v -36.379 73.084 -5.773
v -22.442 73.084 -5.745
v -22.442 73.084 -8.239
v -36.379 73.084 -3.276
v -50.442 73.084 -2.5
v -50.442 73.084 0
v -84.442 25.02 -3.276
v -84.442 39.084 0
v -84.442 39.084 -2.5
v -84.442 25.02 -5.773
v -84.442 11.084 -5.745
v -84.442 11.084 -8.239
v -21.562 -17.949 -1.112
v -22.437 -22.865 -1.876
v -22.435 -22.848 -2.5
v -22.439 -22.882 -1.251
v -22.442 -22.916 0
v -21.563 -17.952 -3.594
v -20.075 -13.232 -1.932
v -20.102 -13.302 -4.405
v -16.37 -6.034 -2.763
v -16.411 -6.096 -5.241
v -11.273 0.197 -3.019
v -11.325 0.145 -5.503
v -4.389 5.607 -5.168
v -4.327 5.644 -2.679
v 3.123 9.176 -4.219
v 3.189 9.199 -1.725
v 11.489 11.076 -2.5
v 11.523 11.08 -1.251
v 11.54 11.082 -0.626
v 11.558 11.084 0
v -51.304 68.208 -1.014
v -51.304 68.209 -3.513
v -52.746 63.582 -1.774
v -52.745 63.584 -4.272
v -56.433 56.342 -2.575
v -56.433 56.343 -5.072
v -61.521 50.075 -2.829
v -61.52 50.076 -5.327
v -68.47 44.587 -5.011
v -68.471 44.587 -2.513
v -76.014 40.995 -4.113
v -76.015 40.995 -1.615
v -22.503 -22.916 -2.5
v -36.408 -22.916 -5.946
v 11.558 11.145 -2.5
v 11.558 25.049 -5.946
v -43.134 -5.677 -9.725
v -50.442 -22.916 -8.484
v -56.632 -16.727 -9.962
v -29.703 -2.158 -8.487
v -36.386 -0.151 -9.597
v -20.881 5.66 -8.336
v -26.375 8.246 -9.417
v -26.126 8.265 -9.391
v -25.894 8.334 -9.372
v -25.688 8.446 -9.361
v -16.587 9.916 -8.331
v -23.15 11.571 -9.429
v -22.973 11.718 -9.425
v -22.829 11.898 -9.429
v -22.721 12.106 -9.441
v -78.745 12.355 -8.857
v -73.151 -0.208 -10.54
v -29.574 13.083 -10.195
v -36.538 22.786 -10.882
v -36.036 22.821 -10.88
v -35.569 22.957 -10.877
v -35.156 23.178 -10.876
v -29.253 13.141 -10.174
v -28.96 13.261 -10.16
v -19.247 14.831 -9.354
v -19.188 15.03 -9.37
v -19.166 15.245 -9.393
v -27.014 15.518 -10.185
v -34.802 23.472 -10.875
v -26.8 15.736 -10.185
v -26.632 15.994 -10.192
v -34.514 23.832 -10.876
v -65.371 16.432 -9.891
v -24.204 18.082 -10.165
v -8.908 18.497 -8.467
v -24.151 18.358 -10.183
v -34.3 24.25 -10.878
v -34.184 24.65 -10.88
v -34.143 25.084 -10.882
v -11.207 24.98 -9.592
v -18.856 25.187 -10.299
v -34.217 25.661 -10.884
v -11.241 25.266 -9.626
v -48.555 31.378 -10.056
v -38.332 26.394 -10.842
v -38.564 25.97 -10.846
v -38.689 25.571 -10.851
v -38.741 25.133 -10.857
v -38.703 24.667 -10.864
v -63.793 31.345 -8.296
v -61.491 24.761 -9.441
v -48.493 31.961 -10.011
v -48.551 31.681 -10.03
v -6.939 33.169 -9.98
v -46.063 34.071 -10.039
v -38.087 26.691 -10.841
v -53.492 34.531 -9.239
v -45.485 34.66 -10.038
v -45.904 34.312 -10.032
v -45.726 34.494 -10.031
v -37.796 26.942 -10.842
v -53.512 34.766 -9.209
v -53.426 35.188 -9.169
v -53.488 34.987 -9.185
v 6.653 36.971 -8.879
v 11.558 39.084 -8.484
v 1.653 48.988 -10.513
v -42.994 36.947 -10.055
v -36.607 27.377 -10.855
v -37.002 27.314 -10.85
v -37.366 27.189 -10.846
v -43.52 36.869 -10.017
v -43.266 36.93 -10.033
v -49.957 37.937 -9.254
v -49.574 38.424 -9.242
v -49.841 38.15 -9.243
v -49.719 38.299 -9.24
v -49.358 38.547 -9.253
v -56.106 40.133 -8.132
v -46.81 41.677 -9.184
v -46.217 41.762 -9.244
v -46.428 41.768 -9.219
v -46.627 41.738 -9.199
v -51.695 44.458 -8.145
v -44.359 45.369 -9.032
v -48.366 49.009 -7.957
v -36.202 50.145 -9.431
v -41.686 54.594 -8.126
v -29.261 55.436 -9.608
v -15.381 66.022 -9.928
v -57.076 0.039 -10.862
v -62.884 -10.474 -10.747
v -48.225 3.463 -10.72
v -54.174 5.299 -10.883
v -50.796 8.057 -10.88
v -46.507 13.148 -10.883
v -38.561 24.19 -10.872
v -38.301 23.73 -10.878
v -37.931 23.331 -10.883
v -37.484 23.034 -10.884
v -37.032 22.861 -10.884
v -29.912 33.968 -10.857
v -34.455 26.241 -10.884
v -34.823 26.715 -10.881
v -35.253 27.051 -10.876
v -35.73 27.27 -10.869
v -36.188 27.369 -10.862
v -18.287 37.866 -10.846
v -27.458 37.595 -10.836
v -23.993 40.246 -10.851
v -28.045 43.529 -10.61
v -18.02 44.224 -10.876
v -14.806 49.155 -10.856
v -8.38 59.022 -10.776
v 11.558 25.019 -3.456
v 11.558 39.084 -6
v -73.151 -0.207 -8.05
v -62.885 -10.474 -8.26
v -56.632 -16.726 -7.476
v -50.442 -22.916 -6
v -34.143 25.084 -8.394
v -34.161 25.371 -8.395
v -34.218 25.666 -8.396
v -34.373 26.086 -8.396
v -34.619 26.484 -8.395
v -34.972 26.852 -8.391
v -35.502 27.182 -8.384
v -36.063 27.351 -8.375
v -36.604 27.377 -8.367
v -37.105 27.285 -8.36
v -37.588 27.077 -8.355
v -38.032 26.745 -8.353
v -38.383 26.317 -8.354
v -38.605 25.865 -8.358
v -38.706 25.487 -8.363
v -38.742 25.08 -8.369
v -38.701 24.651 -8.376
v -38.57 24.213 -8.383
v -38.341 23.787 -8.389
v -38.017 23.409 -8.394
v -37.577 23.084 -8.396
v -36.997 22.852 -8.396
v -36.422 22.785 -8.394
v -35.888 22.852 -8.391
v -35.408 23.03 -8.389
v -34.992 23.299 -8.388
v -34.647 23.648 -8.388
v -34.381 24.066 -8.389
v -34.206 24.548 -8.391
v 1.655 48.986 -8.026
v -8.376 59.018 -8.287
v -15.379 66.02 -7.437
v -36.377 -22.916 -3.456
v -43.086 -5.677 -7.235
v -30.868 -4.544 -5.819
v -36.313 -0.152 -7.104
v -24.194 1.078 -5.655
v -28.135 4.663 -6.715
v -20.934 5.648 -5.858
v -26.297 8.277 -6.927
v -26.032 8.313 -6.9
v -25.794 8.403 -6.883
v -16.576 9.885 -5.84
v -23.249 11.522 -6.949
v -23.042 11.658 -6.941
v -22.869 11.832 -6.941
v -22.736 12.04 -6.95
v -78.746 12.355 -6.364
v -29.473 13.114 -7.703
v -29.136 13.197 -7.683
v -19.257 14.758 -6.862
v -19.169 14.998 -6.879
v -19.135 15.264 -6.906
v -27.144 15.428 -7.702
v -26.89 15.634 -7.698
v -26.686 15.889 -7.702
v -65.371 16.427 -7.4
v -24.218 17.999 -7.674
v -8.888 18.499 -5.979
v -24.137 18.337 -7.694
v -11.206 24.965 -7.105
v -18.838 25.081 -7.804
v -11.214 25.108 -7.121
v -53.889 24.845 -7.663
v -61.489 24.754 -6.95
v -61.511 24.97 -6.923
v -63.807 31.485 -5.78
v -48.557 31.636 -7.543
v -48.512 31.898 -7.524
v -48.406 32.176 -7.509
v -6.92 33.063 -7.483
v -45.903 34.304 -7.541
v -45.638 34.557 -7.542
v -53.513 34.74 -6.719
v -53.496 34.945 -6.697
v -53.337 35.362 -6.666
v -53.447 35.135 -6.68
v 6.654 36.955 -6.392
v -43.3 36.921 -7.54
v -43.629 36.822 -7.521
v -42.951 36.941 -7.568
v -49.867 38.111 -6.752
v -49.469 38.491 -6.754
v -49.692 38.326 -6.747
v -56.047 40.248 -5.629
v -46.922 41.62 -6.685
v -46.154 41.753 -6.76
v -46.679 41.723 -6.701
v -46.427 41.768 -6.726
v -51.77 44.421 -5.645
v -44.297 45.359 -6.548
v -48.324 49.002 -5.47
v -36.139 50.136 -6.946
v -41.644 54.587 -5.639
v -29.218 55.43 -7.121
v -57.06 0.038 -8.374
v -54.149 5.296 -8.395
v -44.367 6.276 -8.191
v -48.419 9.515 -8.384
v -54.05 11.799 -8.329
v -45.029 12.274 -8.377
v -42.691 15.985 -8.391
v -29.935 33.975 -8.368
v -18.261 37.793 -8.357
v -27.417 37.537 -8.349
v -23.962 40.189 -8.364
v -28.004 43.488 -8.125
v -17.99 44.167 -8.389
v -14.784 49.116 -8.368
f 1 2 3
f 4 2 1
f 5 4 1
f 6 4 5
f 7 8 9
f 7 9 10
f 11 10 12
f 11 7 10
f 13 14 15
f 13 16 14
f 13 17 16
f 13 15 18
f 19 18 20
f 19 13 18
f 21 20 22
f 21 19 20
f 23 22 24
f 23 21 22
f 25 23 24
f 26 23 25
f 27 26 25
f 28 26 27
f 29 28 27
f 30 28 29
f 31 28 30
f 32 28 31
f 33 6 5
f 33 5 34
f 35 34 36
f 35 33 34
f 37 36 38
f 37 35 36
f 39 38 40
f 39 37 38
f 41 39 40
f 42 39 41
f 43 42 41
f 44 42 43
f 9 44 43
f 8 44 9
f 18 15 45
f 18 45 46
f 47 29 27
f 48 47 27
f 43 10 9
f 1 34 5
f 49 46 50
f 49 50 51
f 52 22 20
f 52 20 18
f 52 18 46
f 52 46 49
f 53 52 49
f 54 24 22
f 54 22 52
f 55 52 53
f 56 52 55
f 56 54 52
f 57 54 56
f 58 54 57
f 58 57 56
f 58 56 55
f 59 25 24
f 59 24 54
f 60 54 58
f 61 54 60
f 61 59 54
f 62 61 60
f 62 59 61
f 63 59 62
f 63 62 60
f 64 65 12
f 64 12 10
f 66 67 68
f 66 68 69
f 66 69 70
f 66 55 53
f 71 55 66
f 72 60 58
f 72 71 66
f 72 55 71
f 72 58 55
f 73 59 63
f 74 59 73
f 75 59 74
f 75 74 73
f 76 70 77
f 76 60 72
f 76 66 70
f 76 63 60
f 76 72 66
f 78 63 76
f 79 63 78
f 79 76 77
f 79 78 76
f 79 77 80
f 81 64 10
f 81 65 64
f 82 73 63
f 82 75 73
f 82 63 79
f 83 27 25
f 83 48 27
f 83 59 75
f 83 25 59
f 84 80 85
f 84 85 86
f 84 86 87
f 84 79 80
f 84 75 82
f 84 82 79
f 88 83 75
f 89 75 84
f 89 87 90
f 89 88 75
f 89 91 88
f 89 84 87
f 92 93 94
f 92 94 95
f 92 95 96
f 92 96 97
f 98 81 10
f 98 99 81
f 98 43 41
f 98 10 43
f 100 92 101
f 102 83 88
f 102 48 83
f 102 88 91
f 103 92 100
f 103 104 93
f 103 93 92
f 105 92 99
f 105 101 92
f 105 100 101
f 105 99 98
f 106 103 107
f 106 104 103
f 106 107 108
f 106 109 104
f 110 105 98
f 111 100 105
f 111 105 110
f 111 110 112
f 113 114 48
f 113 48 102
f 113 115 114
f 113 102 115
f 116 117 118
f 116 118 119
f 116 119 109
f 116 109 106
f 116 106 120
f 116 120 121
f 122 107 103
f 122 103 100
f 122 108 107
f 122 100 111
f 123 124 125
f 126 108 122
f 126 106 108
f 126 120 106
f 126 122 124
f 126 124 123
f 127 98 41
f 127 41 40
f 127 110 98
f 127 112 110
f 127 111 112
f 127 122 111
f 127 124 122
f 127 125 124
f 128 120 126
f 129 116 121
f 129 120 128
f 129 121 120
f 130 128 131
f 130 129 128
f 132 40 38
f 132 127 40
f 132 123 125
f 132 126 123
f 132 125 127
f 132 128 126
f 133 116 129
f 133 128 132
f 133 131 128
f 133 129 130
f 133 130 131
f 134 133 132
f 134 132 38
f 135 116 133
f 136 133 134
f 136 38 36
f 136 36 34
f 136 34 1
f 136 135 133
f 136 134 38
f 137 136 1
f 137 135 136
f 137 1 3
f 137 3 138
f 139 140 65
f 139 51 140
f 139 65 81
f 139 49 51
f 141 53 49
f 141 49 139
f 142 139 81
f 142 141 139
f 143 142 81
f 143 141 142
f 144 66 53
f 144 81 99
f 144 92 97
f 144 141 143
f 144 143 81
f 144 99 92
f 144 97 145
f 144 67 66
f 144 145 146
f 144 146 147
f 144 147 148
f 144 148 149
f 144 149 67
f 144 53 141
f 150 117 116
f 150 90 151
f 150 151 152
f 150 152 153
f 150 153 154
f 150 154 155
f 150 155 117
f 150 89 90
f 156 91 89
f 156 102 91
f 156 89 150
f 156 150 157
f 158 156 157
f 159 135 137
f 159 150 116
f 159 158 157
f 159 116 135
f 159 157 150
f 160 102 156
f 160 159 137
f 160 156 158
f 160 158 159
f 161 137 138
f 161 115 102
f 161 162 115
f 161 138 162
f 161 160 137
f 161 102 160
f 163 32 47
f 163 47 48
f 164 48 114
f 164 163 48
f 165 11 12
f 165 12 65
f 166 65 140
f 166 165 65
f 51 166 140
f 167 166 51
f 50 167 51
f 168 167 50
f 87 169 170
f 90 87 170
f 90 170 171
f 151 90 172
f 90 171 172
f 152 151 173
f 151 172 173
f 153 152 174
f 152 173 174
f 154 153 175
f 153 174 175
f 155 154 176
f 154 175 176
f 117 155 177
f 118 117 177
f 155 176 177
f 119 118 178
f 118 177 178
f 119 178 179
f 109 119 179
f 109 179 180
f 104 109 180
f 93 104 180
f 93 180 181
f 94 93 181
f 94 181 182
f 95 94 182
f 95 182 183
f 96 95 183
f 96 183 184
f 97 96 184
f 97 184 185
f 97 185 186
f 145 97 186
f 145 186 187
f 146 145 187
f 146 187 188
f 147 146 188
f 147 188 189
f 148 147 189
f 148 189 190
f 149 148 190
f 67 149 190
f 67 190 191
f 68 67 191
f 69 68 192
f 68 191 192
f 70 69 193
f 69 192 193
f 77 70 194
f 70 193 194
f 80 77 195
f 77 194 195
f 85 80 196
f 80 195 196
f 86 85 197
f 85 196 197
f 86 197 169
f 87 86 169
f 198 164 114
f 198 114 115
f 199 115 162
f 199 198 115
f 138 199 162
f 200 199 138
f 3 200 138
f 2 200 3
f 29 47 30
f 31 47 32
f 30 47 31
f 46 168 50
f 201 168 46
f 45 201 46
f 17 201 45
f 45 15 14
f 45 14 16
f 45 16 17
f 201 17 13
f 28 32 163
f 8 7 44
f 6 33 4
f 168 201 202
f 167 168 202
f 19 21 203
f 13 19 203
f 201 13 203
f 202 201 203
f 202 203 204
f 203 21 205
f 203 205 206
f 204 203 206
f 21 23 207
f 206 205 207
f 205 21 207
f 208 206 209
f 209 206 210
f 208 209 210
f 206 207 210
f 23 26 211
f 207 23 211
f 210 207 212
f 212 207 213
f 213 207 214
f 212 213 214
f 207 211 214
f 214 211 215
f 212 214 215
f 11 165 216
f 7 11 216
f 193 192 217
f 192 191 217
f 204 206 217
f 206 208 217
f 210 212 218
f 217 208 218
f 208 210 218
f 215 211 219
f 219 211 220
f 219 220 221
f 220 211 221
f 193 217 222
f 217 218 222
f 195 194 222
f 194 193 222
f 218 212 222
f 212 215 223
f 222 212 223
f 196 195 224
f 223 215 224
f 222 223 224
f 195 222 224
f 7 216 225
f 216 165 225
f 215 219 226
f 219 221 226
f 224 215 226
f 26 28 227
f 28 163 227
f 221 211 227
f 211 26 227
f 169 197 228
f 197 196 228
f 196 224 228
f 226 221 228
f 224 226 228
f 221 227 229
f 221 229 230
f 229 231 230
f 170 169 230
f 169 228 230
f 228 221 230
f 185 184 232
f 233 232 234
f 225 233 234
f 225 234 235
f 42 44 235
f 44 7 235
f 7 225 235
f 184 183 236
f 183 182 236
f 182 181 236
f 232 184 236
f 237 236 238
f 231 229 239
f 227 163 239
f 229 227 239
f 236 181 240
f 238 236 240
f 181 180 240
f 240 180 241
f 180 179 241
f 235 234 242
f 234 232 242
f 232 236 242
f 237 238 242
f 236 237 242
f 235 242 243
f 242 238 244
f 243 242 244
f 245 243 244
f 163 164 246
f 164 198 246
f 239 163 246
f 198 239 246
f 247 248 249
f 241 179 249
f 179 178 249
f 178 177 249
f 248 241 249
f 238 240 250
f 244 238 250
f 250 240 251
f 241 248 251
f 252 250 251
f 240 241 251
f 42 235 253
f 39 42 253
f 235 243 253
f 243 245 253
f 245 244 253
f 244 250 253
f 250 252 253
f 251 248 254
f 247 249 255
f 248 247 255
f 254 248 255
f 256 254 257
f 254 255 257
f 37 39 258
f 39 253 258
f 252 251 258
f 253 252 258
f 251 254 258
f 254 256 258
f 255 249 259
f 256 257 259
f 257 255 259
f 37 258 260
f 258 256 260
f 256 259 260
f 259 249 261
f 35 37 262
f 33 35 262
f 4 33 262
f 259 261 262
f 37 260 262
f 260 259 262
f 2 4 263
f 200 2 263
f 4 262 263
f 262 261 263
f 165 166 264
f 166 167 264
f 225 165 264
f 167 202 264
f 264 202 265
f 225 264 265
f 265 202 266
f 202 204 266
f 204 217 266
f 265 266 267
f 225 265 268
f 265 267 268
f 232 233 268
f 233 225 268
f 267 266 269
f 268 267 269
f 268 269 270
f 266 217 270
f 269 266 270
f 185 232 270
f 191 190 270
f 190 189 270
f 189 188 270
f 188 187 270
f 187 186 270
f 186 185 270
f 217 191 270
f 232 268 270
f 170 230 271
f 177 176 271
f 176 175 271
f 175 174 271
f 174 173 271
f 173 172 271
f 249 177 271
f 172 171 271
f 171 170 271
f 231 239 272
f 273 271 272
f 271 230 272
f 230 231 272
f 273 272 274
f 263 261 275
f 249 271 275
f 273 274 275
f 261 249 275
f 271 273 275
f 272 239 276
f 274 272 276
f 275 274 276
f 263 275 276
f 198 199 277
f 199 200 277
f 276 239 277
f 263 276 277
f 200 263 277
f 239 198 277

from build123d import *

# Parameters (mm, degrees)
SKETCH2_R           = 2.299249708
BOSS_EXTRUDE1_DEPTH = 12
SKETCH3_OUTSIDE_W   = 41.258
SKETCH3_OUTSIDE_H   = 165.023
CUT_EXTRUDE1_DEPTH  = 112.722871427


with BuildPart() as part:
    # Sketch2 → Boss-Extrude1 (new body)
    with BuildSketch(Plane.XY):
        with BuildLine():
            Line((-84.442352941, 11.083697479), (-50.442352941, -22.916302521))
            Line((-50.442352941, -22.916302521), (-22.442352941, -22.916302521))
            ThreePointArc((-22.442352941, -22.916302521), (-11.414384755, 0.055729293), (11.557647059, 11.083697479))
            Line((11.557647059, 11.083697479), (11.557647059, 39.083697479))
            Line((11.557647059, 39.083697479), (-22.442352941, 73.083697479))
            Line((-22.442352941, 73.083697479), (-50.442352941, 73.083697479))
            ThreePointArc((-50.442352941, 73.083697479), (-61.477304412, 50.118648949), (-84.442352941, 39.083697479))
            Line((-84.442352941, 39.083697479), (-84.442352941, 11.083697479))
        make_face()
        with Locations((-36.442352941, 25.083697479)):
            Circle(SKETCH2_R, mode=Mode.SUBTRACT)
    extrude(amount=-BOSS_EXTRUDE1_DEPTH)

    # Sketch3 outside → Cut-Extrude1 (cut, through all)
    with BuildSketch(Plane(origin=(25.320672269, 25.320672269, 0), x_dir=(0, 0, -1), z_dir=(0.707106781, 0.707106781, 0))):
        with Locations((6, 43.5055)):
            Rectangle(SKETCH3_OUTSIDE_W, SKETCH3_OUTSIDE_H)
        with BuildLine():
            Line((0, 87.346107905), (2.5, 87.346107905))
            add(Edge.make_bspline(
                [(2.5, -0.291956117), (19.268904304, 41.792164318), (2.5, 87.346107905)],
                knots=[0, 0, 0, 0.999526324, 0.999526324, 0.999526324], degree=2))
            Line((2.5, -0.291956117), (0, -0.335132962))
            add(Edge.make_bspline(
                [(0, -0.335132962), (16.792759748, 41.768931155), (0, 87.346107905)],
                knots=[0, 0, 0, 1, 1, 1], degree=2))
        make_face(mode=Mode.SUBTRACT)
    extrude(amount=-CUT_EXTRUDE1_DEPTH, mode=Mode.SUBTRACT)


solid = part.part
